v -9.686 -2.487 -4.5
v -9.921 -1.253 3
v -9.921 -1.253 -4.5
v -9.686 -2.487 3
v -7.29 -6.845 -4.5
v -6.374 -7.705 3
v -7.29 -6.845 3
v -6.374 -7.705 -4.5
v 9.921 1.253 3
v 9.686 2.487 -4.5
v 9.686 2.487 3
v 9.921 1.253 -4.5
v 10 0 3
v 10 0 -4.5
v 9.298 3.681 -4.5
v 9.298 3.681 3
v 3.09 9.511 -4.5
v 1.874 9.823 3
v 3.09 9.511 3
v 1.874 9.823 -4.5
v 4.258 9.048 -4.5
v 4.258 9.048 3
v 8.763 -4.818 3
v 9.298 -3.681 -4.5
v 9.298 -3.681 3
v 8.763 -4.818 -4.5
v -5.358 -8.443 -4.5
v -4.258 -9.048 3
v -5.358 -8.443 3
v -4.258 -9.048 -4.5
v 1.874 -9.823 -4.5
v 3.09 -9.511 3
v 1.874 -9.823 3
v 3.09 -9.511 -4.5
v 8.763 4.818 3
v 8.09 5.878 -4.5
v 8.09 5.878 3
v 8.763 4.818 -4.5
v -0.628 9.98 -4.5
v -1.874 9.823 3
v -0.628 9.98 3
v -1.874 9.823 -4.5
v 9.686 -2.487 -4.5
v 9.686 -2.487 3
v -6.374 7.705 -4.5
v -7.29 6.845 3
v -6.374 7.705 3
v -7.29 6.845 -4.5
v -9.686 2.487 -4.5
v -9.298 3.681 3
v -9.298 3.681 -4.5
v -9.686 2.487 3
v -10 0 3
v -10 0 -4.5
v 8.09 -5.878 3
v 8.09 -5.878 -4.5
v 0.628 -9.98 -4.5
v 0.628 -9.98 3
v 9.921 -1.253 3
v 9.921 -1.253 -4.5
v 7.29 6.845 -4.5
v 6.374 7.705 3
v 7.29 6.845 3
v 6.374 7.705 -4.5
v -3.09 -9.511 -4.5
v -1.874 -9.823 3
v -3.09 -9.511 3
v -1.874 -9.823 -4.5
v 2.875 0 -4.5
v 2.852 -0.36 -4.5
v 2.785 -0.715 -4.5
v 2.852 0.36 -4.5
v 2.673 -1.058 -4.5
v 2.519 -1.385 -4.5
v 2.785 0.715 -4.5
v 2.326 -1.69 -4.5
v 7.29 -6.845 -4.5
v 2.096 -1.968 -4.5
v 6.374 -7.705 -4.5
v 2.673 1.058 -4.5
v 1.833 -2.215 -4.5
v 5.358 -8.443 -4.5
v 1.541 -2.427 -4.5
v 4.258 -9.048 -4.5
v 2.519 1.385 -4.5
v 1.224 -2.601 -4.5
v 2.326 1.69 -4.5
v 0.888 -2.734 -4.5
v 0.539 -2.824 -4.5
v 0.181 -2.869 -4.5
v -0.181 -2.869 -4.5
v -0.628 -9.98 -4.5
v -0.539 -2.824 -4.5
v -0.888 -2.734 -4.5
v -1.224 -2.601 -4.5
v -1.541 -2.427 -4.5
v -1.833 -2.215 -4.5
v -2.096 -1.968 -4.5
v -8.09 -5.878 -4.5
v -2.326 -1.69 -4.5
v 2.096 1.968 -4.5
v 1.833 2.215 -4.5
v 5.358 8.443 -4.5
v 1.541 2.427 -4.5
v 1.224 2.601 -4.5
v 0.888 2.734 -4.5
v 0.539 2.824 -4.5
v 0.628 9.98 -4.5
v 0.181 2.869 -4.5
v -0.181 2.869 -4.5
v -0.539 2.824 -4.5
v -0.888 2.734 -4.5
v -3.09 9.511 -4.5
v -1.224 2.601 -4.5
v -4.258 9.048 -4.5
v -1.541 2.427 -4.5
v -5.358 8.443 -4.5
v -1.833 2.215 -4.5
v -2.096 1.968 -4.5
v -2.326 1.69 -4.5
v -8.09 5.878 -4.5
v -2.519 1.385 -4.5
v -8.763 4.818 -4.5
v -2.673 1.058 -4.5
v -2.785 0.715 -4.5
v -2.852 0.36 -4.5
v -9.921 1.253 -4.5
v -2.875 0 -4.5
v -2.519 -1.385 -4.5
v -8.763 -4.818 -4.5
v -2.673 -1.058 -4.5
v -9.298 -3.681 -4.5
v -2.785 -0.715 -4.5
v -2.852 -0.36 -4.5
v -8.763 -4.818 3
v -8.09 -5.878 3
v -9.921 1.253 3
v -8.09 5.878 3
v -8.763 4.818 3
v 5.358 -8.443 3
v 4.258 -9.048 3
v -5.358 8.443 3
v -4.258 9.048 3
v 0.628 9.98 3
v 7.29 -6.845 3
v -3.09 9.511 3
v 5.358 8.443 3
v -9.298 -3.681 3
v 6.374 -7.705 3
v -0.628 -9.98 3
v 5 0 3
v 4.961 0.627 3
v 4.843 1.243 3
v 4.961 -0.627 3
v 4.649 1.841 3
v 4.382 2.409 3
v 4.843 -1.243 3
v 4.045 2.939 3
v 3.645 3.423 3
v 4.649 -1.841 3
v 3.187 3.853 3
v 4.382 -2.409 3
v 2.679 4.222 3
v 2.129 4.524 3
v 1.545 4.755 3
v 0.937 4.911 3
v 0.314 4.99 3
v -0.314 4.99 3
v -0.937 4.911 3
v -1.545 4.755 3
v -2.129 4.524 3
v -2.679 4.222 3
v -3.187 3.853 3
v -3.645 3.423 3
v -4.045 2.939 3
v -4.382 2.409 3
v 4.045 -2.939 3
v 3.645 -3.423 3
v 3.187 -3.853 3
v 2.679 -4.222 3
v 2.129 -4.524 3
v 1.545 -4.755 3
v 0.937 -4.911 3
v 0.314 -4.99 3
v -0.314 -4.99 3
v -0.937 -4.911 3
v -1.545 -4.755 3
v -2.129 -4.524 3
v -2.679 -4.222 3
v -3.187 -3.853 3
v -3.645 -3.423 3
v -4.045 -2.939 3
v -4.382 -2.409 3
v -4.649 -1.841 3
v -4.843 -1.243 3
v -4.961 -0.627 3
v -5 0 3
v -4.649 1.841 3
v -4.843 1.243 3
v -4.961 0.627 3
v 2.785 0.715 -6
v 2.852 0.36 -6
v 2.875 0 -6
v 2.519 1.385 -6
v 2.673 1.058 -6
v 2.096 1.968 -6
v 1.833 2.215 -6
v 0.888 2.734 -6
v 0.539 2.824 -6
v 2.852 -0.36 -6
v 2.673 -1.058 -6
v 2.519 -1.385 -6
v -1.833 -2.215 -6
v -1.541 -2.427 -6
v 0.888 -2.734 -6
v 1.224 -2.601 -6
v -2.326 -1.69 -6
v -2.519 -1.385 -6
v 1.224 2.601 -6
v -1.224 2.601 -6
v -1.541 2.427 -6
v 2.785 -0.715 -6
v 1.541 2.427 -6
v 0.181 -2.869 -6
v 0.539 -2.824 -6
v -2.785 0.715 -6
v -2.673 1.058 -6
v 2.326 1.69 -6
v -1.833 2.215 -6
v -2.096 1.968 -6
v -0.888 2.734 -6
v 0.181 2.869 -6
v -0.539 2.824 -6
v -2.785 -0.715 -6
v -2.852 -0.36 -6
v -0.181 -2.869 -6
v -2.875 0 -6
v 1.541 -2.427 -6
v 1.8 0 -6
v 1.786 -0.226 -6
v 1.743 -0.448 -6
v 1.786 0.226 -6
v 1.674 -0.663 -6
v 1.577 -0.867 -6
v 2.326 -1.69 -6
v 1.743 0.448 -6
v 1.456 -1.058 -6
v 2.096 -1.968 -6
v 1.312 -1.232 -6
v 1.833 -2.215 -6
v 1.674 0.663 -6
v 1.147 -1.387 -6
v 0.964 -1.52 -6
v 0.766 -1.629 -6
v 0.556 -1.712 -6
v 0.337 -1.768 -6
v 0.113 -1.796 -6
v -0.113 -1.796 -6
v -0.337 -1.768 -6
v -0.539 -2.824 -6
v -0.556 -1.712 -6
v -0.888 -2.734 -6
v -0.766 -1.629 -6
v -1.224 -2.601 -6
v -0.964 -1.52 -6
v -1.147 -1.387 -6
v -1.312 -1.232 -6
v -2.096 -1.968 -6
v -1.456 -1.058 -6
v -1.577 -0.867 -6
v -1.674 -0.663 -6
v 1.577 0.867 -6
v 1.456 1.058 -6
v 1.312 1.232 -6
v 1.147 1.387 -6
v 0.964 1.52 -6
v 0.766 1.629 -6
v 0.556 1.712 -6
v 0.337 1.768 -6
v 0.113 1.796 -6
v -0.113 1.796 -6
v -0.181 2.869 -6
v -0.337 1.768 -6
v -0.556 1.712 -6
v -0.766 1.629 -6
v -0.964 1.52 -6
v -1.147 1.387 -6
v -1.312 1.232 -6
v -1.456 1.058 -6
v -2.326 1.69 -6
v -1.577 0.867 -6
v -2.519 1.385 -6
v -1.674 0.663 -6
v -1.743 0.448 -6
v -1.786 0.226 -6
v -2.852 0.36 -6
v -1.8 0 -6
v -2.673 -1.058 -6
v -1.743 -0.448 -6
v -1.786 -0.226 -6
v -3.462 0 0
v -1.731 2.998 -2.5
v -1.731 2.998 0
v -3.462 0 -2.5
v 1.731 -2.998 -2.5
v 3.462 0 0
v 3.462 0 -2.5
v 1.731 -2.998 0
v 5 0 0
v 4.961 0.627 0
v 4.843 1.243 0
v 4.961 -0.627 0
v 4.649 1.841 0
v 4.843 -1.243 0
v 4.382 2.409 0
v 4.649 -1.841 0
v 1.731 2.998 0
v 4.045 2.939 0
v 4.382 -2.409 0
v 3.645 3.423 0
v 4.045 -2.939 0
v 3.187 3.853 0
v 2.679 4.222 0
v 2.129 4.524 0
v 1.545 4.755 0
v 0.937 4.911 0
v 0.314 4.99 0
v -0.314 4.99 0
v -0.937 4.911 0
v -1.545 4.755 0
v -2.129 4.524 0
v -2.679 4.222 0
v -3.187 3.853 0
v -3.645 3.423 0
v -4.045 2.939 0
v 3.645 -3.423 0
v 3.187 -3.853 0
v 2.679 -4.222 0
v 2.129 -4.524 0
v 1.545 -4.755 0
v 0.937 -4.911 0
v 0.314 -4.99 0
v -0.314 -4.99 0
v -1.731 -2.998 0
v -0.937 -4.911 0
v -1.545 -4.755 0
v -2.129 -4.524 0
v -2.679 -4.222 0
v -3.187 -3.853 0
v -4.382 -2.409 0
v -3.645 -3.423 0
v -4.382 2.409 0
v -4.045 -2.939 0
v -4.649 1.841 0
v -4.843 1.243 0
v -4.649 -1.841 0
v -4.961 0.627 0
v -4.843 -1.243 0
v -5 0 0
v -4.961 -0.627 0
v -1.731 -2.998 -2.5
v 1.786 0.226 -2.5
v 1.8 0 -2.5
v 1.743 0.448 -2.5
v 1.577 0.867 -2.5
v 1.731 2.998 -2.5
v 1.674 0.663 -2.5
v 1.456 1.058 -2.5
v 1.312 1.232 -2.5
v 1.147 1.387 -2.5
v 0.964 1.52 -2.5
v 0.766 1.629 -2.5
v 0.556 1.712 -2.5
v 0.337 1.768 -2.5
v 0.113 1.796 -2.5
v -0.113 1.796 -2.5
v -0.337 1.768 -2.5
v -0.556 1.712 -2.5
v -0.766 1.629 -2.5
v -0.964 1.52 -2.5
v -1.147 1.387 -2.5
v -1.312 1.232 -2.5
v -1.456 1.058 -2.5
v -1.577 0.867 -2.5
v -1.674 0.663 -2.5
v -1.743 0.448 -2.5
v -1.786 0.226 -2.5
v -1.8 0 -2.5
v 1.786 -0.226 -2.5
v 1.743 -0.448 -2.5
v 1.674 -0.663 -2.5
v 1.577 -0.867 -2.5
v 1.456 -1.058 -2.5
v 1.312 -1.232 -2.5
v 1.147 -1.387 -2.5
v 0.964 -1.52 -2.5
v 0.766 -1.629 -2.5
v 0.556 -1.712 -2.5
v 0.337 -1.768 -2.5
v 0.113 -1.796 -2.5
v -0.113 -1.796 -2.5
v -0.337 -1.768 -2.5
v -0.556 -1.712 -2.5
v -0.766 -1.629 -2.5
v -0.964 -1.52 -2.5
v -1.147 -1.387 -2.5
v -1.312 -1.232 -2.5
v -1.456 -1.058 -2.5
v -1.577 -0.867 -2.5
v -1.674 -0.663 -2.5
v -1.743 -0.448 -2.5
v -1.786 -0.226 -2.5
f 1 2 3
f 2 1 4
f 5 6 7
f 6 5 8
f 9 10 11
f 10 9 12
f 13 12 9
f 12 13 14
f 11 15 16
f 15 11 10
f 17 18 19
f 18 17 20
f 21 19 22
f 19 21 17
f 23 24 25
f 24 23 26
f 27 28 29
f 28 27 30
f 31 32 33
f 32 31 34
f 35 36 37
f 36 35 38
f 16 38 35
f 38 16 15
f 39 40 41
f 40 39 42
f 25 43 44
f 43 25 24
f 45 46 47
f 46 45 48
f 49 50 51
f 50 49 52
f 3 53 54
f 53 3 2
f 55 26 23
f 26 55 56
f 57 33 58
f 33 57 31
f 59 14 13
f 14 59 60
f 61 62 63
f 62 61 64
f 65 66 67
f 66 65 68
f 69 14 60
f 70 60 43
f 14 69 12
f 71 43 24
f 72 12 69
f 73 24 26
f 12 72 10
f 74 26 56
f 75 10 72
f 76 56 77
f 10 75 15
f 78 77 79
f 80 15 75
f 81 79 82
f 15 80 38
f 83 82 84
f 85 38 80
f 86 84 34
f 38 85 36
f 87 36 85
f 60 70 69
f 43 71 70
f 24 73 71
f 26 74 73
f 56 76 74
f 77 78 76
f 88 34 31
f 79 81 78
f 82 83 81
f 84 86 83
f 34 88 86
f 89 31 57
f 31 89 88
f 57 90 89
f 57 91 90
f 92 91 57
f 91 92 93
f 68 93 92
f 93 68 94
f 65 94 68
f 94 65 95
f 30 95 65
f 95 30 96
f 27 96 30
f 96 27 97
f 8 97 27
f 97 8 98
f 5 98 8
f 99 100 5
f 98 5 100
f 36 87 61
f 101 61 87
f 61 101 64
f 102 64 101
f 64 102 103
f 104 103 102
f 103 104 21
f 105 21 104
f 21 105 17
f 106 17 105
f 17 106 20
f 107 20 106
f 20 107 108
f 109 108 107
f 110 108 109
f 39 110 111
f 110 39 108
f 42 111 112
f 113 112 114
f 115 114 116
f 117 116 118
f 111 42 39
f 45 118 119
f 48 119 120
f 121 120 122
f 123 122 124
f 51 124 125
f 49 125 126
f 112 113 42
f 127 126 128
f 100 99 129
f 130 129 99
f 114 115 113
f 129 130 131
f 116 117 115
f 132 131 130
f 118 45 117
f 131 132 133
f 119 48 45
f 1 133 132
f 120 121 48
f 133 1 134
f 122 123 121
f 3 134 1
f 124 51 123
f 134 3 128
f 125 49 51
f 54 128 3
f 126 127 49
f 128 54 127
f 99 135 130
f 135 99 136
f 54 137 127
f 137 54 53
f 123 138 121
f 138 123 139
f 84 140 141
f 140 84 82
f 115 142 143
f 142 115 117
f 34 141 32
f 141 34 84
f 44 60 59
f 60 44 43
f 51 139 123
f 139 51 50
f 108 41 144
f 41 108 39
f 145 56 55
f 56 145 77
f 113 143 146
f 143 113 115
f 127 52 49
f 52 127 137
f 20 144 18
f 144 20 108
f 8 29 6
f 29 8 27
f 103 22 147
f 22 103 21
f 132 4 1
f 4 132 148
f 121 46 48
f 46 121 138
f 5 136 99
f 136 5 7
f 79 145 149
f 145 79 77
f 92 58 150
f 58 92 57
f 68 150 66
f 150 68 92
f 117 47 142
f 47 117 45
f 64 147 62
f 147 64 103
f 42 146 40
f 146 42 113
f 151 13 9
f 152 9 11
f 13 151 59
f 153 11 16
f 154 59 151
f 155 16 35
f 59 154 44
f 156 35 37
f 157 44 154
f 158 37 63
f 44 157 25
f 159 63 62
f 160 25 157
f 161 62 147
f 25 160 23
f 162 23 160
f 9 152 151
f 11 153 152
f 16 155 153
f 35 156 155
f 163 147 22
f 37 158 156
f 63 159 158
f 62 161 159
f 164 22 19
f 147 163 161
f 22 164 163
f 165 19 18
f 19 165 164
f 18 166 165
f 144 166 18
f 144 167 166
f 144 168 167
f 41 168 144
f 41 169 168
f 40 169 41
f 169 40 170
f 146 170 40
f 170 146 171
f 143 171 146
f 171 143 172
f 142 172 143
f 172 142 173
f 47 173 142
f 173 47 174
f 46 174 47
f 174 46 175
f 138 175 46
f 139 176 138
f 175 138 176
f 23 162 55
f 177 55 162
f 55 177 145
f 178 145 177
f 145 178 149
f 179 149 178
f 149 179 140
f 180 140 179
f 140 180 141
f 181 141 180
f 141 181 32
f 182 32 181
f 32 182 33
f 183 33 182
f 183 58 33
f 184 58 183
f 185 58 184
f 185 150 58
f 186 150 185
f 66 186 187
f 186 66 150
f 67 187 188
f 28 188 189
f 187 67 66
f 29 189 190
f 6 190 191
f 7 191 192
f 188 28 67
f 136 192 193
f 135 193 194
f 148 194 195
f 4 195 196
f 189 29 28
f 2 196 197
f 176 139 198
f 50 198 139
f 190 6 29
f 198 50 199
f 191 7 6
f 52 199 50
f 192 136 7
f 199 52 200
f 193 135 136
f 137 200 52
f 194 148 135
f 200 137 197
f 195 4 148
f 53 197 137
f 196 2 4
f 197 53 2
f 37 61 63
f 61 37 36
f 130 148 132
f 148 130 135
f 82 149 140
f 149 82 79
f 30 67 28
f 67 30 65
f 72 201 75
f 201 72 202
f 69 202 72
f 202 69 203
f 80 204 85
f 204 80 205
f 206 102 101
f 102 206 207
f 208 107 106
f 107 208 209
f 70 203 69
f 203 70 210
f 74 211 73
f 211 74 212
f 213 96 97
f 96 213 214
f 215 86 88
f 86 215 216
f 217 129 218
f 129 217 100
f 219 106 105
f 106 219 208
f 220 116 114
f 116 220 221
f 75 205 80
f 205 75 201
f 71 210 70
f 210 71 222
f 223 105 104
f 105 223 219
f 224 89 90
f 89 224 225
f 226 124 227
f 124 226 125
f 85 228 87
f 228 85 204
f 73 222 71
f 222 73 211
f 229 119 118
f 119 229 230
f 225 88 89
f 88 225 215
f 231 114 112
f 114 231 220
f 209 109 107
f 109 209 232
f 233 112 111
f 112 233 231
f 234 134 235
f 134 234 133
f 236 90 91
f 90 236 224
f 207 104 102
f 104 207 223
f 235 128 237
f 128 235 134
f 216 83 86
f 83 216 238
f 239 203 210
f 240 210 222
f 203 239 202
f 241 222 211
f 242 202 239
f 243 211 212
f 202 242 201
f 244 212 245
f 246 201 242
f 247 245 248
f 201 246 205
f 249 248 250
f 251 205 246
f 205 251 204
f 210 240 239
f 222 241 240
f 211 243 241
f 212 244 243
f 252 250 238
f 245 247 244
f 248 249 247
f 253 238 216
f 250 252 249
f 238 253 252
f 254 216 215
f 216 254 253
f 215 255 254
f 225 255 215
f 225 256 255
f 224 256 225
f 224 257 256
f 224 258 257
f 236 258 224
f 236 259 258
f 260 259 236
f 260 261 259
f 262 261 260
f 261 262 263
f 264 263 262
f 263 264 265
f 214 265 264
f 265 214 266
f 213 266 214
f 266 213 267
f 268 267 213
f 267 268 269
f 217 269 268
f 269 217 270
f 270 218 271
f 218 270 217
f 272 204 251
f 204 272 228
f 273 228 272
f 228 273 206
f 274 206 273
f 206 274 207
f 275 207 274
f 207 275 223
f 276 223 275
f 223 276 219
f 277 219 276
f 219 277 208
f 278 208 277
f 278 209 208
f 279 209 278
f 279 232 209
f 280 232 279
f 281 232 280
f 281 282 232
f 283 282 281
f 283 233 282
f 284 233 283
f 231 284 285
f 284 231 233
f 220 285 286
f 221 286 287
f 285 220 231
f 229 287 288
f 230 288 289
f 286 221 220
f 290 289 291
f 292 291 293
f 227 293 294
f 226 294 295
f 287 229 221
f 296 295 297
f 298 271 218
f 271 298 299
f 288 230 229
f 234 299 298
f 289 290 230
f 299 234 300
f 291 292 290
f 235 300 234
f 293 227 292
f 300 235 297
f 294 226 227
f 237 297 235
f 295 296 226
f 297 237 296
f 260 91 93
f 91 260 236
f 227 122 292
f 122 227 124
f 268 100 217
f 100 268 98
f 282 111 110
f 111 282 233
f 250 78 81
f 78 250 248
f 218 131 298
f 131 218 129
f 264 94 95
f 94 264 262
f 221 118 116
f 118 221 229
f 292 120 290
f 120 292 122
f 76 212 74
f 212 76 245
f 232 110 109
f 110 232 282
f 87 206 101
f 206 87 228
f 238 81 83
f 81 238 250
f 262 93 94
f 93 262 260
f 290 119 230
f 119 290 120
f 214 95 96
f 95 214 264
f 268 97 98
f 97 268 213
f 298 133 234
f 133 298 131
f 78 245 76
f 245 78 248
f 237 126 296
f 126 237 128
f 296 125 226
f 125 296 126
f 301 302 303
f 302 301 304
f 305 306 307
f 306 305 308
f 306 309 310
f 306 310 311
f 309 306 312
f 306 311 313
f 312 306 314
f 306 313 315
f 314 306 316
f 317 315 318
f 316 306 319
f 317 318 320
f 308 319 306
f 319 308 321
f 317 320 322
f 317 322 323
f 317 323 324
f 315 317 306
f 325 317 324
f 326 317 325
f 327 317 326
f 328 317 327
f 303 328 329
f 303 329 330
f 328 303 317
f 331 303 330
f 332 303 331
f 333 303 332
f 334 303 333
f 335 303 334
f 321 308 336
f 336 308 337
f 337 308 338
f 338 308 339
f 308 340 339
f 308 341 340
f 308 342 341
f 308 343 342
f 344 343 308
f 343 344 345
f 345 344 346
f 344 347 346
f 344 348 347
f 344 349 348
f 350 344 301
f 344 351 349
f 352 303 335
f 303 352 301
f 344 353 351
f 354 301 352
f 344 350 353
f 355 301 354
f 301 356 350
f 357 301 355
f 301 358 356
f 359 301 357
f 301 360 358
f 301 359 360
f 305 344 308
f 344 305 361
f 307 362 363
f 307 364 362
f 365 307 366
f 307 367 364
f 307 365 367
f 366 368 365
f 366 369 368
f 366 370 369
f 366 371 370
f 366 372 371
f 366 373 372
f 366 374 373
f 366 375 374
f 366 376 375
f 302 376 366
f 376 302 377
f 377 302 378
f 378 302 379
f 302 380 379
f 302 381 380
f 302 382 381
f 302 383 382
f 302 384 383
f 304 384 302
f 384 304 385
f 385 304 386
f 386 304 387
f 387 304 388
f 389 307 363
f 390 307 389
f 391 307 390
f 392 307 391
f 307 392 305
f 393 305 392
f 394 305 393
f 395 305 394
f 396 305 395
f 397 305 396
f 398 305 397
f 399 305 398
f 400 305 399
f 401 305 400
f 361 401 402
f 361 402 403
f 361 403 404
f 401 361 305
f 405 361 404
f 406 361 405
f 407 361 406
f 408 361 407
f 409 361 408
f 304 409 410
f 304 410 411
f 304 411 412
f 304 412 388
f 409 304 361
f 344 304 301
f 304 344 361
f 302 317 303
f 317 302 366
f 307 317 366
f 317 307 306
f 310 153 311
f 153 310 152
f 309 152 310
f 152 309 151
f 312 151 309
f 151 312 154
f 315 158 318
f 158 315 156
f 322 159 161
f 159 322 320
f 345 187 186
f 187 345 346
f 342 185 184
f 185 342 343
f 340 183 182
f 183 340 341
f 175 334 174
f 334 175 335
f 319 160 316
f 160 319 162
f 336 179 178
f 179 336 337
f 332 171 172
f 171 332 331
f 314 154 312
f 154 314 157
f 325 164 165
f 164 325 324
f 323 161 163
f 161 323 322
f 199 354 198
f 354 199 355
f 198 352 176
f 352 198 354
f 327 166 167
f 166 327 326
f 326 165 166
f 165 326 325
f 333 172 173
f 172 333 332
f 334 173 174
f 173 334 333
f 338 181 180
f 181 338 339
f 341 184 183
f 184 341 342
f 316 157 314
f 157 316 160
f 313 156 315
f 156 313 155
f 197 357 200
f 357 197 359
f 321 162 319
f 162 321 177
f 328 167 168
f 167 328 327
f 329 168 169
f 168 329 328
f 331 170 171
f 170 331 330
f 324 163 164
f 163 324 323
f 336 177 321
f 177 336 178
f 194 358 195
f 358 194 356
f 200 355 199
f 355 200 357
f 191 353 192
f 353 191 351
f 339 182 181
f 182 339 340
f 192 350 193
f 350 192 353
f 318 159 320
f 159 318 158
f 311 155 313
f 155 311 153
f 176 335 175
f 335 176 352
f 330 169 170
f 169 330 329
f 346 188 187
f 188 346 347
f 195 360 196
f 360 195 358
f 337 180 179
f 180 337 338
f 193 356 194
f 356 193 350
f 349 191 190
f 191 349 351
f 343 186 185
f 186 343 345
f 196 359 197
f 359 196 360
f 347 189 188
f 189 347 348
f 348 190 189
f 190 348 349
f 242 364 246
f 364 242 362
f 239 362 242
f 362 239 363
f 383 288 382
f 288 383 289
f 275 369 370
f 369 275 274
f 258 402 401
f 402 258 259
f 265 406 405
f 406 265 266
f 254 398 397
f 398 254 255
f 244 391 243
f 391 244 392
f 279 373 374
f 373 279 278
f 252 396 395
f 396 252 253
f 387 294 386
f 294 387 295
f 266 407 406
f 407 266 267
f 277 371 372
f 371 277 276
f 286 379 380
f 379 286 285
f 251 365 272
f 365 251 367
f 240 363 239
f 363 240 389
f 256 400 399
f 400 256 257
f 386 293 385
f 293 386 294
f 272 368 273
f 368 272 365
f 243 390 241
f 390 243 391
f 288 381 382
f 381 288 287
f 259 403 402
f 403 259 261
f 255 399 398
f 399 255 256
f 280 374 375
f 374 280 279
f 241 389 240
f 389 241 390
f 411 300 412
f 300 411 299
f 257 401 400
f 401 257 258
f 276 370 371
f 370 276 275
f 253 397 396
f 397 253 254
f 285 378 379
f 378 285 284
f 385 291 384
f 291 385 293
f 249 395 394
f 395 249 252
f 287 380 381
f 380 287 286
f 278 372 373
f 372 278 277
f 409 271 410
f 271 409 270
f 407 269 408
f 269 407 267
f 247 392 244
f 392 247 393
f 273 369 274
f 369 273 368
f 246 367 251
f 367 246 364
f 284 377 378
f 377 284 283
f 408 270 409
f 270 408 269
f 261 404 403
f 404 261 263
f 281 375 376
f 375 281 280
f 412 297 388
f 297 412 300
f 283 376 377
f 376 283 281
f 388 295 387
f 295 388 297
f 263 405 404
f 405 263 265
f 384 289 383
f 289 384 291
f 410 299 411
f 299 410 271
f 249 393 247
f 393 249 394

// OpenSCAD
$fn = 50;


difference() {
	union() {
		translate(v = [0, 0, -4.5000000000]) {
			cylinder(h = 7.5000000000, r = 10.0000000000);
		}
		#translate(v = [0, 0, -6.0000000000]) {
			cylinder(h = 6, r = 2.8750000000);
		}
	}
	union() {
		translate(v = [0, 0, 0]) {
			rotate(a = [0, 0, 0]) {
				difference() {
					union() {
						translate(v = [0, 0, -2.5000000000]) {
							linear_extrude(height = 2.5000000000) {
								polygon(points = [[3.4620000000, 0.0000000000], [1.7310000000, 2.9981799479], [-1.7310000000, 2.9981799479], [-3.4620000000, 0.0000000000], [-1.7310000000, -2.9981799479], [1.7310000000, -2.9981799479]]);
							}
						}
					}
					union();
				}
			}
		}
		#cylinder(h = 3, r = 5.0000000000);
		#translate(v = [0, 0, -100.0000000000]) {
			cylinder(h = 200, r = 1.8000000000);
		}
	}
}
